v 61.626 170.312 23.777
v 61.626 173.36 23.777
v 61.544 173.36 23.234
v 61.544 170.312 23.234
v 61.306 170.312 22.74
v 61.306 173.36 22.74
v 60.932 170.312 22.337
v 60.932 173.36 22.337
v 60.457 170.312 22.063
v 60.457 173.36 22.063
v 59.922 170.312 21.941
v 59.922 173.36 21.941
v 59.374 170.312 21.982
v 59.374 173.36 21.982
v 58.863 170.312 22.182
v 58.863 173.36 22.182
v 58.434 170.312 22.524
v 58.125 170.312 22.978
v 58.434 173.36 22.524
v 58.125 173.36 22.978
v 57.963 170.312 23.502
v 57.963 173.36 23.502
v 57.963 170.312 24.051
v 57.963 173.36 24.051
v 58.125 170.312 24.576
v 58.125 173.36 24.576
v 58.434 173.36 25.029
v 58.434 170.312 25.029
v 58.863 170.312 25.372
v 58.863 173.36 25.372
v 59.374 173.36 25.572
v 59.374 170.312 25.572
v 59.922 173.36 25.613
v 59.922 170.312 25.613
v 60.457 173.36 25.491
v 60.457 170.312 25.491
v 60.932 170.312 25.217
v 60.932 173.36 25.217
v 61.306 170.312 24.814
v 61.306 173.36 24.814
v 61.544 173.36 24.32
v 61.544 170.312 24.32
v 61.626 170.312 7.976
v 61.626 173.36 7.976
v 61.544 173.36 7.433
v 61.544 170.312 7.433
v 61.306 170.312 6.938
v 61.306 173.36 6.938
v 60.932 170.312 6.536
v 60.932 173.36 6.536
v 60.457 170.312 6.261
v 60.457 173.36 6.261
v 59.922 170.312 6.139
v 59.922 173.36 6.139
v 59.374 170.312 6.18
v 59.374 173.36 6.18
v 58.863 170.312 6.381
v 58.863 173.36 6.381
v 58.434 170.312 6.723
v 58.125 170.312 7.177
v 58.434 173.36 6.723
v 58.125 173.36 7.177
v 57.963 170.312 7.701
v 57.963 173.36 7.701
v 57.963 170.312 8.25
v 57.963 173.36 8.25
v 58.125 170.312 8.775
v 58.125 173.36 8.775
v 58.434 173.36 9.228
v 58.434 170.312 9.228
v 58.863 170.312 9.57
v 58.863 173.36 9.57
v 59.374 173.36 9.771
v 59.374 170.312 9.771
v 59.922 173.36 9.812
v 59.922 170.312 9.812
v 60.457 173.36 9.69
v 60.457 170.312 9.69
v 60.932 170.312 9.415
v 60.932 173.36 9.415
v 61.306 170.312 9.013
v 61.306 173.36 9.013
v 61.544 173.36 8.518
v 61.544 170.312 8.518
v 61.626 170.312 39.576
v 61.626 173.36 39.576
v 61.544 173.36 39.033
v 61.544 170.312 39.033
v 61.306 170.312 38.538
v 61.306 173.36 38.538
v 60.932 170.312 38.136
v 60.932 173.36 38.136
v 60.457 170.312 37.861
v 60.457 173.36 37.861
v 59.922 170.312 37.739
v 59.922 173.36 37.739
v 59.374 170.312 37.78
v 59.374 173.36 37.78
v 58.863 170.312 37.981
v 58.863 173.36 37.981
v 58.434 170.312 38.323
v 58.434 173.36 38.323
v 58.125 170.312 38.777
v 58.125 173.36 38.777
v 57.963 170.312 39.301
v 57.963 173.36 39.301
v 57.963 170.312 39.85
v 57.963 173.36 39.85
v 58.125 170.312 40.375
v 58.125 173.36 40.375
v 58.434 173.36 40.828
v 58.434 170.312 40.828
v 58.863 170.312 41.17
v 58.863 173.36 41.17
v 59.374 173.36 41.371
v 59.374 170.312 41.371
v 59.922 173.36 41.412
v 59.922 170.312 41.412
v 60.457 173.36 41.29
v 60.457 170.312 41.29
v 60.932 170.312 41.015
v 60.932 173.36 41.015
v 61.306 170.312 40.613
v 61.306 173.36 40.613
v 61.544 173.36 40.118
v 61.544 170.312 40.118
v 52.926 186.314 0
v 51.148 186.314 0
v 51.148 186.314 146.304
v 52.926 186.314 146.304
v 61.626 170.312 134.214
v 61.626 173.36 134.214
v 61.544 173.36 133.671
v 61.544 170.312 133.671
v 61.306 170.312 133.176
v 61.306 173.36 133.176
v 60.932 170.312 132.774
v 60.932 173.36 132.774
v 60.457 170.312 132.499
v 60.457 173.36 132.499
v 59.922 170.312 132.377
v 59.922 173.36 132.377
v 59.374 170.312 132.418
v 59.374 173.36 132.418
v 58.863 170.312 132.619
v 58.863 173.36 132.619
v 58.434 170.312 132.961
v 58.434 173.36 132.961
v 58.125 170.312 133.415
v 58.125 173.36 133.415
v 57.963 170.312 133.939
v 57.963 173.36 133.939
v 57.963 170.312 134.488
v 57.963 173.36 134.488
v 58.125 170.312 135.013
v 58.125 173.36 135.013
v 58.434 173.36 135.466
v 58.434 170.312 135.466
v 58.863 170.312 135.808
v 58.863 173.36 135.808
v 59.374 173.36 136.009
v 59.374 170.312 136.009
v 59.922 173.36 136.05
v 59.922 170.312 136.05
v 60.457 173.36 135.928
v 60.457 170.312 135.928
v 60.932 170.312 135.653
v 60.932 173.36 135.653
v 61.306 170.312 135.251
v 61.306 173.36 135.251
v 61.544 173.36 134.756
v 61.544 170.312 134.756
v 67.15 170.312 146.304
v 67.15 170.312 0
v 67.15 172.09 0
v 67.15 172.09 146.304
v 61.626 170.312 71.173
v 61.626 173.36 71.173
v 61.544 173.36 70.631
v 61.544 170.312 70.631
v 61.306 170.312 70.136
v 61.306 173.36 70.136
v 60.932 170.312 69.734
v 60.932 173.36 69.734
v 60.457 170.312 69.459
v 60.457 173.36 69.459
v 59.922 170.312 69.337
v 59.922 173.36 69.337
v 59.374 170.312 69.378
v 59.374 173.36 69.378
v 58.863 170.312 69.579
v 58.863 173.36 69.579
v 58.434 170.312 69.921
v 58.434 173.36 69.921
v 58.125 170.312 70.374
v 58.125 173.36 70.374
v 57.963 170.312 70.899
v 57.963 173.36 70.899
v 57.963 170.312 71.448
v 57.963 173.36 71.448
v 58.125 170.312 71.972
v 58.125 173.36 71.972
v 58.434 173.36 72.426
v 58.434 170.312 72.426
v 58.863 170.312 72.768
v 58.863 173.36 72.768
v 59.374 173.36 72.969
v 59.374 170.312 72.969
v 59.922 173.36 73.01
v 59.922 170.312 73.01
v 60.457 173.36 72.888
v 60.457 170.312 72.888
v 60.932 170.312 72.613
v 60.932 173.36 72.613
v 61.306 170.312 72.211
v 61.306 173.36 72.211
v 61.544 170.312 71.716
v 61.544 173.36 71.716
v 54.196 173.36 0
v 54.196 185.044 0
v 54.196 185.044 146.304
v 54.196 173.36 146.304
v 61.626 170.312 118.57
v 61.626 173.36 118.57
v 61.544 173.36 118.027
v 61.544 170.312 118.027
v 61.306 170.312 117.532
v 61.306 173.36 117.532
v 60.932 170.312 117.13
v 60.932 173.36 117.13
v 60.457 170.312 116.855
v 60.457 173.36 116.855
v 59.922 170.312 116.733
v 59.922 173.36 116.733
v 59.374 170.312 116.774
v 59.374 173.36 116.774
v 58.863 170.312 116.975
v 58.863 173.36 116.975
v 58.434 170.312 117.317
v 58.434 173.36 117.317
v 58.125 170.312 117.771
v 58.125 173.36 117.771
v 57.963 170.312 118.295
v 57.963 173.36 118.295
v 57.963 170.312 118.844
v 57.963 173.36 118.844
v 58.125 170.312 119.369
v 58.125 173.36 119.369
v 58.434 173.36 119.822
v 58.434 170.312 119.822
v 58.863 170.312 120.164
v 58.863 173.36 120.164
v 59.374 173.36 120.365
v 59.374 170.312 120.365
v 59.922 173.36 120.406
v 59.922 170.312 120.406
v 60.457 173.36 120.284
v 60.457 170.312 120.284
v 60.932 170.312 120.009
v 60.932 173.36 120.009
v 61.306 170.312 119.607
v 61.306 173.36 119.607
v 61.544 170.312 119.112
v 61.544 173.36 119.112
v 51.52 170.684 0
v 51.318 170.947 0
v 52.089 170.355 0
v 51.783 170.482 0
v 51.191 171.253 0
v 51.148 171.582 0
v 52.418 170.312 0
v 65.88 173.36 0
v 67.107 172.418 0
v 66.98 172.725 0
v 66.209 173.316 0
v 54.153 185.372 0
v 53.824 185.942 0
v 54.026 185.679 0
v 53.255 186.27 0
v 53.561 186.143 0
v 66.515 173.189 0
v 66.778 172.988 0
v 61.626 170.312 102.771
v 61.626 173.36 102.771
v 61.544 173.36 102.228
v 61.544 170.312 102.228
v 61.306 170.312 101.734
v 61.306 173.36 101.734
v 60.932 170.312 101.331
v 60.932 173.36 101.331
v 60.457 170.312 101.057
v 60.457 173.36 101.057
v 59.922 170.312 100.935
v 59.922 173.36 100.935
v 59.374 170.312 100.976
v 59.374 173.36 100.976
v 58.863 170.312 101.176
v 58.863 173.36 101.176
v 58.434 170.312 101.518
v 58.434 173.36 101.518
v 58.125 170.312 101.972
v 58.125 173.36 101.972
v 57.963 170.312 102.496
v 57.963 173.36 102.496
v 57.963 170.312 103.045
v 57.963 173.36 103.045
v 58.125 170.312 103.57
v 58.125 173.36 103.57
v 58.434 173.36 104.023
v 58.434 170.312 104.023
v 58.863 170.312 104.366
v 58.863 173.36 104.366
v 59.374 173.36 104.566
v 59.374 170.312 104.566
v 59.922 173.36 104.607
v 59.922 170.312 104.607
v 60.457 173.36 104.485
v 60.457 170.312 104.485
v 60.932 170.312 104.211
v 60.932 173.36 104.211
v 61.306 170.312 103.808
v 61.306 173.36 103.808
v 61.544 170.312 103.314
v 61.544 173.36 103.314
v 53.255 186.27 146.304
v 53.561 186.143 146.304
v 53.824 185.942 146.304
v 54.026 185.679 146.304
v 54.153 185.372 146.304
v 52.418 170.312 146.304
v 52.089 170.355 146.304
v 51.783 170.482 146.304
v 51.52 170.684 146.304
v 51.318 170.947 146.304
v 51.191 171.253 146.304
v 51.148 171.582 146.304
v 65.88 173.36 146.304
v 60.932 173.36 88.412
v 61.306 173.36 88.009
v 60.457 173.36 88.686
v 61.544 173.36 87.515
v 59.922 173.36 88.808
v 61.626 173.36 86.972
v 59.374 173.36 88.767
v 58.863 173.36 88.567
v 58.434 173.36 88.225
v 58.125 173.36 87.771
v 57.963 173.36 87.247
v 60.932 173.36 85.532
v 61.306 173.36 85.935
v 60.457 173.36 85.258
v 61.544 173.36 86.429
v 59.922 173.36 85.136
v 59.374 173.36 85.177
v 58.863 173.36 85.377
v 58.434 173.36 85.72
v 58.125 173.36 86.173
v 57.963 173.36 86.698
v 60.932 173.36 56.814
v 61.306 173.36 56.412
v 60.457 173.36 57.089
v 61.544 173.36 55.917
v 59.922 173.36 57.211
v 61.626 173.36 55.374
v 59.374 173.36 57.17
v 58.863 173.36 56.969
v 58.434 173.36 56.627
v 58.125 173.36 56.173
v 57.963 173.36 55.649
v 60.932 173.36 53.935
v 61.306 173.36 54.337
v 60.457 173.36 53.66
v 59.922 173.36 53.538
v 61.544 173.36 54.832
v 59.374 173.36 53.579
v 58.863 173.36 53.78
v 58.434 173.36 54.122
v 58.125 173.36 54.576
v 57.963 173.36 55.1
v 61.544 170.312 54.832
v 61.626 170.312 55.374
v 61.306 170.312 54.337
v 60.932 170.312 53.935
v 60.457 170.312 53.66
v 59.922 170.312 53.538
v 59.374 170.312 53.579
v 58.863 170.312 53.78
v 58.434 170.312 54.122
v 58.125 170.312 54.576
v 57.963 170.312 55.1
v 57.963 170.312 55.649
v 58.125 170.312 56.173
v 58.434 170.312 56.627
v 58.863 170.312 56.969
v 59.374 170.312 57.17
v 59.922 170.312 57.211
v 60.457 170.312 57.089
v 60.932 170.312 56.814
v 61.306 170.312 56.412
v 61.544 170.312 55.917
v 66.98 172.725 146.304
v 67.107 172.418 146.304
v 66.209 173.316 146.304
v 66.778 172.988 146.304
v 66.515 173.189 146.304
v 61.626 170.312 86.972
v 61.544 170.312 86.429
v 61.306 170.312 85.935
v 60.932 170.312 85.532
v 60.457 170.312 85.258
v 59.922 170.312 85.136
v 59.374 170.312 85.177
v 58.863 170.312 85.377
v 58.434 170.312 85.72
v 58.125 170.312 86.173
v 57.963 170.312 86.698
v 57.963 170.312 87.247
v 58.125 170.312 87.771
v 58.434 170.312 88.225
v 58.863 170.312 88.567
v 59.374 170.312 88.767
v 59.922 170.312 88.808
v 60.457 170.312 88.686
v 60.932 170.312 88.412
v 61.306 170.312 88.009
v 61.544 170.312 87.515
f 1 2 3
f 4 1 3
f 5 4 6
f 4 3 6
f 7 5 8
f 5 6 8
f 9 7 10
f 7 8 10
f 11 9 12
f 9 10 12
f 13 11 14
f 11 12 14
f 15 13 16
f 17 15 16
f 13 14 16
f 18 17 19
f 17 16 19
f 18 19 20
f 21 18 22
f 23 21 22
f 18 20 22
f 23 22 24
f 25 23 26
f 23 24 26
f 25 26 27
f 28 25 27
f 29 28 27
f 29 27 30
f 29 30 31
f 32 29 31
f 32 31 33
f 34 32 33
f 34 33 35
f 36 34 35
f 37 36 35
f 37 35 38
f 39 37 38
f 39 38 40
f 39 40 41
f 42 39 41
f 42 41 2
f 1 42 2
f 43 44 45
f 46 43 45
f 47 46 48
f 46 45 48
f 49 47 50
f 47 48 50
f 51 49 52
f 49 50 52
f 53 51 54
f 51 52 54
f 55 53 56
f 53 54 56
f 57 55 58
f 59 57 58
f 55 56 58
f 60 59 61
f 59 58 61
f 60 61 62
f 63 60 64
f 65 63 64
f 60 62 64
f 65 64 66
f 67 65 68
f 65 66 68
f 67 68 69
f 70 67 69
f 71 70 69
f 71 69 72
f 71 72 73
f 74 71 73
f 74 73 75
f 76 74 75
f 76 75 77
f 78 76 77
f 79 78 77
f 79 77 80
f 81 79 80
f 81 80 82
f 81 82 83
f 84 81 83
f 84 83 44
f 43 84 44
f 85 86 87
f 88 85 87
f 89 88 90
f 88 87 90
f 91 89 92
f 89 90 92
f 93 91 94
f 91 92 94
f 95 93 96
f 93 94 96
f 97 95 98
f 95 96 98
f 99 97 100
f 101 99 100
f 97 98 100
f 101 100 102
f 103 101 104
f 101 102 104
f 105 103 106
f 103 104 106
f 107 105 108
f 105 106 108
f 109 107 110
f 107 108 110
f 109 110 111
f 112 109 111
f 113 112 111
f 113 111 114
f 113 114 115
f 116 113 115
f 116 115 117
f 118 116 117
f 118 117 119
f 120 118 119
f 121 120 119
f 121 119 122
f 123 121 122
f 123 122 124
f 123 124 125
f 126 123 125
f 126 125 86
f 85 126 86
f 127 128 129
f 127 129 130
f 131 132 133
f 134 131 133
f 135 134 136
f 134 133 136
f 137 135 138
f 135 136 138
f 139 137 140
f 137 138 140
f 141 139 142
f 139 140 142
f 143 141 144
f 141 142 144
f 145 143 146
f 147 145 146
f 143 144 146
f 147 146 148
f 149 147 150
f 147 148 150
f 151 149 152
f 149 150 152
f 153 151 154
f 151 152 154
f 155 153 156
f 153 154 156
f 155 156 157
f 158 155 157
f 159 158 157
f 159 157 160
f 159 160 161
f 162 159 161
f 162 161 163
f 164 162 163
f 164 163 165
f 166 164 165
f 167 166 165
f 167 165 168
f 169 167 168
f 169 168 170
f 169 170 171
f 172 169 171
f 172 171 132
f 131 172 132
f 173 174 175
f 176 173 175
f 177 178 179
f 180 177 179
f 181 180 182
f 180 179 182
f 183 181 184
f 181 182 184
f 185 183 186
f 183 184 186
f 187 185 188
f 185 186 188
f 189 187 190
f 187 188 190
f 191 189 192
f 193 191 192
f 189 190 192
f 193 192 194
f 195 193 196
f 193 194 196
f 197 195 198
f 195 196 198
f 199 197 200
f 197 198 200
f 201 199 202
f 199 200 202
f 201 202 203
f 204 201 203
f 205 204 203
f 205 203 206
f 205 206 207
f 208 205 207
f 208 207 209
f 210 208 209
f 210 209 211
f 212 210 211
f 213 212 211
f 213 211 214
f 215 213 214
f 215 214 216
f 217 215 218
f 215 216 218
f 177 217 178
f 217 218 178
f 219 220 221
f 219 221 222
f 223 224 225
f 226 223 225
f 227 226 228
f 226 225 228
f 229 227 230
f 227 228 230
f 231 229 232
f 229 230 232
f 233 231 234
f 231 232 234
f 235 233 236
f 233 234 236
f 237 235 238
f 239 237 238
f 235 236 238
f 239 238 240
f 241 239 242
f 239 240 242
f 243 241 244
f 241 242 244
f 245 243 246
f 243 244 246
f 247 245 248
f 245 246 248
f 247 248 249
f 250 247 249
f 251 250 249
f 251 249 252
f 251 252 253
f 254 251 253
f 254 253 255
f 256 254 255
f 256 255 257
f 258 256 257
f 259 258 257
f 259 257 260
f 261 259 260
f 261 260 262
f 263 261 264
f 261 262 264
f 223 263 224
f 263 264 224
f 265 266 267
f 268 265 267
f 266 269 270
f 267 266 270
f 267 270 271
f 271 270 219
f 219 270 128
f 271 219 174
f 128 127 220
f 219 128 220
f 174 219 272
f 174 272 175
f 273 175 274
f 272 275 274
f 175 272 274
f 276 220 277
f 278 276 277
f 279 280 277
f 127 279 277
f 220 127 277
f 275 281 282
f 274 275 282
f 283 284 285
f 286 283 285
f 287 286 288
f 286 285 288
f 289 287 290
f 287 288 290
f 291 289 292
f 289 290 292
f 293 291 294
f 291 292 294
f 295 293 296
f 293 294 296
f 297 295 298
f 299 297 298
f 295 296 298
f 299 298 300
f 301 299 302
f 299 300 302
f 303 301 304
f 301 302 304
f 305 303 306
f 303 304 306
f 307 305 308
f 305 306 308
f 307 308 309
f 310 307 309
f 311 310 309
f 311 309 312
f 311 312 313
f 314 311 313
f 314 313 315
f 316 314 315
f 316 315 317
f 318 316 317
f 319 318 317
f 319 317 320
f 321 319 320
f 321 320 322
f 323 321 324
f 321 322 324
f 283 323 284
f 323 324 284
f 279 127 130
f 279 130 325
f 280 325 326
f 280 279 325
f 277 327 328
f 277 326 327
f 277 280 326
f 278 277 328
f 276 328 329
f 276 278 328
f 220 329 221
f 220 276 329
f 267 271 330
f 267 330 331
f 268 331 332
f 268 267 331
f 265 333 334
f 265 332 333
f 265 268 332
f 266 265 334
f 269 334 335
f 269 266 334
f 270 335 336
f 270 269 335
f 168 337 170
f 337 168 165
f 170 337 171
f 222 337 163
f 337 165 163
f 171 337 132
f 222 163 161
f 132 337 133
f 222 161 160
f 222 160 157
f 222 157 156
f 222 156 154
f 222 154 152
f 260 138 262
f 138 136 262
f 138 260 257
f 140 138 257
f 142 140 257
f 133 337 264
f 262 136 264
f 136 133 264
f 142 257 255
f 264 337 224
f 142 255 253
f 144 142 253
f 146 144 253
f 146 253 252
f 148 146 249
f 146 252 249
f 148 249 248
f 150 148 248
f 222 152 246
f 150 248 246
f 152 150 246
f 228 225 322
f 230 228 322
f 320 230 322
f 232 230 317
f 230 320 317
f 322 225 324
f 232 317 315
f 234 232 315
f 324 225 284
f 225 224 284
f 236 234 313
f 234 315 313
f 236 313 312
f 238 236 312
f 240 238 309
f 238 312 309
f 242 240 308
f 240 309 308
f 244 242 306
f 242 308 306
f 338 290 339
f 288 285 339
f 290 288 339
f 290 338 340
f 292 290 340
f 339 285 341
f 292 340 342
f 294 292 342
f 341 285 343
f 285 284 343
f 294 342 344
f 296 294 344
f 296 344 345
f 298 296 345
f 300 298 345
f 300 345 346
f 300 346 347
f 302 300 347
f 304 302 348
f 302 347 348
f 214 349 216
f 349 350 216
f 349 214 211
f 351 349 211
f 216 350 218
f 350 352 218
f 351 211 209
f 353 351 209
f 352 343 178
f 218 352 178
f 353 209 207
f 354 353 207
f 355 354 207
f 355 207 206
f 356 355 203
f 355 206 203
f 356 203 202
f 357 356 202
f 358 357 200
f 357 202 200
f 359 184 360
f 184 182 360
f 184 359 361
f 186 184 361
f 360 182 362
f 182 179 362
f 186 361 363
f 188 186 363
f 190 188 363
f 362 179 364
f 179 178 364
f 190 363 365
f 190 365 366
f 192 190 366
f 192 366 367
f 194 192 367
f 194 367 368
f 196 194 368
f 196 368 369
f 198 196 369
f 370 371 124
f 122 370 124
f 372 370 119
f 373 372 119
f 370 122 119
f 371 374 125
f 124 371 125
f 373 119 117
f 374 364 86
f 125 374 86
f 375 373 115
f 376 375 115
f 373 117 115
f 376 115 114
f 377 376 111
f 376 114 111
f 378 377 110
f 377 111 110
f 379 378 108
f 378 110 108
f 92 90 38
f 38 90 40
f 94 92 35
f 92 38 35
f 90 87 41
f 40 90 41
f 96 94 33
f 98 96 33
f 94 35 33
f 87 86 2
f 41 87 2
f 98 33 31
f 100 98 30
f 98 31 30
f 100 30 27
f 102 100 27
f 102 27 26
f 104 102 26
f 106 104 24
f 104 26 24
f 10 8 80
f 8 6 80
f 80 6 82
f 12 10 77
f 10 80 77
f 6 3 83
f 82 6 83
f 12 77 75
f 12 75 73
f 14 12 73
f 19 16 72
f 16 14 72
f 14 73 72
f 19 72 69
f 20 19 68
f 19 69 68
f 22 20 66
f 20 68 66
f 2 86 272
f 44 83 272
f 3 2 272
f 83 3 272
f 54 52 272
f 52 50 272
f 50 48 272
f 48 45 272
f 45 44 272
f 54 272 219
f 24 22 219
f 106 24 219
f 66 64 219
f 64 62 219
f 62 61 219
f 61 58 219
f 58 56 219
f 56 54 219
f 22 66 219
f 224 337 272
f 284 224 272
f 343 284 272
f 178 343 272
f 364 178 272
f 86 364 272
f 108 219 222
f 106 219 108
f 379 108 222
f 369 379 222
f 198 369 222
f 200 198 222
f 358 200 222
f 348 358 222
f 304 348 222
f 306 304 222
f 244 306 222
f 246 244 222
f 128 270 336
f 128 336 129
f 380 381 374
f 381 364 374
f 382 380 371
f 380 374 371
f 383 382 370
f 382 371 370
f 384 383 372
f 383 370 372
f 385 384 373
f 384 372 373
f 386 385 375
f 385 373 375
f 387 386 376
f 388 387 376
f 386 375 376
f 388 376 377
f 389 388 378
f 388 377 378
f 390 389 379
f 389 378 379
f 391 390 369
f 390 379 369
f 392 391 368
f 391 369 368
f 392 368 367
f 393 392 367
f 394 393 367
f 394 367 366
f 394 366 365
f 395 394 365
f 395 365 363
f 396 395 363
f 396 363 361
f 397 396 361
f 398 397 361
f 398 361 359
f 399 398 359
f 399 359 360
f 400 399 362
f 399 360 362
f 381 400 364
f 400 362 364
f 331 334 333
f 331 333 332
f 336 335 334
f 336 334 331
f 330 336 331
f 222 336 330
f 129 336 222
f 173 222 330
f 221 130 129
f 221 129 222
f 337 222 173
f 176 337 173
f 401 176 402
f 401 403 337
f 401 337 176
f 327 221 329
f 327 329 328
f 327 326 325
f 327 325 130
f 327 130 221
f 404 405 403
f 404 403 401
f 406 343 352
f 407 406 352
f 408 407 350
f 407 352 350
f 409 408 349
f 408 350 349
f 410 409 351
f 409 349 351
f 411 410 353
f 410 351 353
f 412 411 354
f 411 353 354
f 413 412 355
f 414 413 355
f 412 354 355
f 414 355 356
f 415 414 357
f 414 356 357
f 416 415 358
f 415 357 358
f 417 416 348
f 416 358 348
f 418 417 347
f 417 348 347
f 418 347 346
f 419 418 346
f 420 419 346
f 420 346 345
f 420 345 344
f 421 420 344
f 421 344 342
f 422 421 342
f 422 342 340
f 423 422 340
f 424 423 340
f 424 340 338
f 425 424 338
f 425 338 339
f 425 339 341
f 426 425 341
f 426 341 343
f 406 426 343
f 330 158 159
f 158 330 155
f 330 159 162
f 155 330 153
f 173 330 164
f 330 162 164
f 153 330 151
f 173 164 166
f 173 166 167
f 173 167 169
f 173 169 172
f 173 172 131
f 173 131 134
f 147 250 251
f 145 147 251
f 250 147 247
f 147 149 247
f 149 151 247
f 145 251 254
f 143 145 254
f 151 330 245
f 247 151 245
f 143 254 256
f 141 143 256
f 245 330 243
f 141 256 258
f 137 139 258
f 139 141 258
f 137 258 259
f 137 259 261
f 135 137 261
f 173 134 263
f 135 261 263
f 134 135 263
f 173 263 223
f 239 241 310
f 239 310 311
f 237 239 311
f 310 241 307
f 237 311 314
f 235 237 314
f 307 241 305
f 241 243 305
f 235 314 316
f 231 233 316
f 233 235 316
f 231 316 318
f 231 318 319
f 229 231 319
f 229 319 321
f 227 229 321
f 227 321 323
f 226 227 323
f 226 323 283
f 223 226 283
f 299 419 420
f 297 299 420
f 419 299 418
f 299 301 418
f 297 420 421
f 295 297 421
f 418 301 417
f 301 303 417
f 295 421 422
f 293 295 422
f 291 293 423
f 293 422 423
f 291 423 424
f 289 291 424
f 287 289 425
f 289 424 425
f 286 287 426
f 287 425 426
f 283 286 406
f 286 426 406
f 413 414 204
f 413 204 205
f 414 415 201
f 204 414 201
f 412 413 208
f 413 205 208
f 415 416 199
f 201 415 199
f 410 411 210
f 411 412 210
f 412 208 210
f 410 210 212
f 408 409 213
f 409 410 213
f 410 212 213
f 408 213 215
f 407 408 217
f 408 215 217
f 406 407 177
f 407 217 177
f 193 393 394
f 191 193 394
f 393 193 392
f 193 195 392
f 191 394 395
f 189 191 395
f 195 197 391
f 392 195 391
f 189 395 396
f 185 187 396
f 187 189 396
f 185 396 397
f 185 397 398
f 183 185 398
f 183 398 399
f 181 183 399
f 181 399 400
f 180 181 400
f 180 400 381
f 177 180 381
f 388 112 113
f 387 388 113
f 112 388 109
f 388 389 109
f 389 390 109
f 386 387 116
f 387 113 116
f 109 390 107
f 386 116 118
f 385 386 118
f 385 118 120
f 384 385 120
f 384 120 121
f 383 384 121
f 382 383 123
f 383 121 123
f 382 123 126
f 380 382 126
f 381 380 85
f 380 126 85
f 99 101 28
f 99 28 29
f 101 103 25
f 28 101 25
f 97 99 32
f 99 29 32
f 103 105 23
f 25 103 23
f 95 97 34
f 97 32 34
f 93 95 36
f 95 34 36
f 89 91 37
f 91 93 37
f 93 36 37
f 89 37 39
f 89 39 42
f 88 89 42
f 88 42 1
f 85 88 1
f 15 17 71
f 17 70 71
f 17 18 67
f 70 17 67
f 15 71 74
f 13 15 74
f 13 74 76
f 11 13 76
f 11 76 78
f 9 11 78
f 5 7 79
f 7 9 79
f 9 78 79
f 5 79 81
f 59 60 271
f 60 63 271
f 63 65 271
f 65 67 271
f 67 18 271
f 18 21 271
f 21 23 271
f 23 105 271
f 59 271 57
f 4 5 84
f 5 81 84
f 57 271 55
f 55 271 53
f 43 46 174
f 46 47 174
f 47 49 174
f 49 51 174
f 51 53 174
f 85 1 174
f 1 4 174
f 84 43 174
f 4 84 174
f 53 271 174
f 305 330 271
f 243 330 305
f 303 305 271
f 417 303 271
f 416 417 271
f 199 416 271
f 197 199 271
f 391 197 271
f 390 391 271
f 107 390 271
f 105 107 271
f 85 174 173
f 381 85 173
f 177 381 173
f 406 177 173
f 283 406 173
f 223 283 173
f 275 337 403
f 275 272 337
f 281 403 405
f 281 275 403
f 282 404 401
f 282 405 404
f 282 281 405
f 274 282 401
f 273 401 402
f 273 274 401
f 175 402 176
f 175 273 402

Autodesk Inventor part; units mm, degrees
ref_plane "YZ Plane" through (0, 0, 0) normal (1, 0, 0) x (0, 1, 0)
ref_plane "XZ Plane" through (0, 0, 0) normal (0, 1, 0) x (-1, 0, 0)
ref_plane "XY Plane" through (0, 0, 0) normal (0, 0, 1) x (1, 0, 0)
sketch "Sketch1" plane through (0, 0, 0) normal (0, 0, 1) x (1, 0, 0)
  line L0 (52.418, 170.3116) -> (67.15, 170.3116)
  line L1 (67.15, 170.3116) -> (67.15, 167.2636)
  line L2 (51.148, 171.5816) -> (51.148, 186.3136)
  line L3 (51.148, 186.3136) -> (52.926, 186.3136)
  line L4 (54.196, 185.0436) -> (54.196, 173.3596)
  line L5 (67.15, 170.3116) -> (67.15, 172.0896)
  line L6 (65.88, 173.3596) -> (54.196, 173.3596)
  arc A0 (54.196, 185.0436) -> (52.926, 186.3136) centre (52.926, 185.0436) ccw
  arc A1 (67.15, 172.0896) -> (65.88, 173.3596) centre (65.88, 172.0896) ccw
  arc A2 (51.148, 171.5816) -> (52.418, 170.3116) centre (52.418, 171.5816) ccw
  point P0 (0, 0)
  point P1 (51.148, 170.3116)
  point P2 (54.196, 186.3136)
  point P3 (67.15, 173.3596)
  dimension "d0" = 16.002
  dimension "d1" = 3.048
  dimension "d2" = 16.002
  dimension "d3" = 3.048
  dimension "d4" = 3.048
  dimension "d5" = 1.27
  dimension "d6" = 1.27
extrude "Extrusion1" add sketch "Sketch1" along normal blind 146.304
sketch "Sketch3" plane through (54.196, 173.3596, 0) normal (0, 1, 0) x (1, 0, 0)
  line L0 (0.9375, 6.2475) -> (13.2819, 6.2475)
  line L1 (12.954, 0) -> (-1.778, 0) projected
  line L2 (5.588, 0) -> (5.588, -6.1341)
  line L3 (-1.778, -146.304) -> (12.954, -146.304) projected
  circle A0 centre (5.588, -7.9756) radius 1.8415
  line L4 (5.588, -7.9756) -> (5.588, -130.5306)
  circle A1 centre (5.588, -134.2136) radius 1.8415
  point P0 (-54.196, 0)
  dimension "d31" = 12.3444
  dimension "d32" = 6.1341
  dimension "d38" = 122.555
extrude "Extrusion6" cut sketch "Sketch3" against normal blind 69.85
sketch "Sketch4" plane through (54.196, 173.3596, 0) normal (0, 1, 0) x (1, 0, 0)
  circle A0 centre (5.588, -7.9756) radius 1.8415 projected
  line L0 (5.588, -25.6184) -> (6.1855, -25.6184)
  circle A1 centre (5.588, -23.7769) radius 1.8415
  circle A2 centre (5.588, -39.5757) radius 1.8415
  circle A3 centre (5.588, -55.3745) radius 1.8415
  circle A4 centre (5.588, -71.1733) radius 1.8415
  circle A5 centre (5.588, -86.9721) radius 1.8415
  circle A6 centre (5.588, -102.7709) radius 1.8415
  circle A7 centre (5.588, -118.5697) radius 1.8415
  point P0 (-54.196, 0)
extrude "Extrusion7" cut sketch "Sketch4" against normal blind 34.925 contours A1 | A2 | A3 | A4 | A5 | A6 | A7
properties part number "L Bracket with holes"
